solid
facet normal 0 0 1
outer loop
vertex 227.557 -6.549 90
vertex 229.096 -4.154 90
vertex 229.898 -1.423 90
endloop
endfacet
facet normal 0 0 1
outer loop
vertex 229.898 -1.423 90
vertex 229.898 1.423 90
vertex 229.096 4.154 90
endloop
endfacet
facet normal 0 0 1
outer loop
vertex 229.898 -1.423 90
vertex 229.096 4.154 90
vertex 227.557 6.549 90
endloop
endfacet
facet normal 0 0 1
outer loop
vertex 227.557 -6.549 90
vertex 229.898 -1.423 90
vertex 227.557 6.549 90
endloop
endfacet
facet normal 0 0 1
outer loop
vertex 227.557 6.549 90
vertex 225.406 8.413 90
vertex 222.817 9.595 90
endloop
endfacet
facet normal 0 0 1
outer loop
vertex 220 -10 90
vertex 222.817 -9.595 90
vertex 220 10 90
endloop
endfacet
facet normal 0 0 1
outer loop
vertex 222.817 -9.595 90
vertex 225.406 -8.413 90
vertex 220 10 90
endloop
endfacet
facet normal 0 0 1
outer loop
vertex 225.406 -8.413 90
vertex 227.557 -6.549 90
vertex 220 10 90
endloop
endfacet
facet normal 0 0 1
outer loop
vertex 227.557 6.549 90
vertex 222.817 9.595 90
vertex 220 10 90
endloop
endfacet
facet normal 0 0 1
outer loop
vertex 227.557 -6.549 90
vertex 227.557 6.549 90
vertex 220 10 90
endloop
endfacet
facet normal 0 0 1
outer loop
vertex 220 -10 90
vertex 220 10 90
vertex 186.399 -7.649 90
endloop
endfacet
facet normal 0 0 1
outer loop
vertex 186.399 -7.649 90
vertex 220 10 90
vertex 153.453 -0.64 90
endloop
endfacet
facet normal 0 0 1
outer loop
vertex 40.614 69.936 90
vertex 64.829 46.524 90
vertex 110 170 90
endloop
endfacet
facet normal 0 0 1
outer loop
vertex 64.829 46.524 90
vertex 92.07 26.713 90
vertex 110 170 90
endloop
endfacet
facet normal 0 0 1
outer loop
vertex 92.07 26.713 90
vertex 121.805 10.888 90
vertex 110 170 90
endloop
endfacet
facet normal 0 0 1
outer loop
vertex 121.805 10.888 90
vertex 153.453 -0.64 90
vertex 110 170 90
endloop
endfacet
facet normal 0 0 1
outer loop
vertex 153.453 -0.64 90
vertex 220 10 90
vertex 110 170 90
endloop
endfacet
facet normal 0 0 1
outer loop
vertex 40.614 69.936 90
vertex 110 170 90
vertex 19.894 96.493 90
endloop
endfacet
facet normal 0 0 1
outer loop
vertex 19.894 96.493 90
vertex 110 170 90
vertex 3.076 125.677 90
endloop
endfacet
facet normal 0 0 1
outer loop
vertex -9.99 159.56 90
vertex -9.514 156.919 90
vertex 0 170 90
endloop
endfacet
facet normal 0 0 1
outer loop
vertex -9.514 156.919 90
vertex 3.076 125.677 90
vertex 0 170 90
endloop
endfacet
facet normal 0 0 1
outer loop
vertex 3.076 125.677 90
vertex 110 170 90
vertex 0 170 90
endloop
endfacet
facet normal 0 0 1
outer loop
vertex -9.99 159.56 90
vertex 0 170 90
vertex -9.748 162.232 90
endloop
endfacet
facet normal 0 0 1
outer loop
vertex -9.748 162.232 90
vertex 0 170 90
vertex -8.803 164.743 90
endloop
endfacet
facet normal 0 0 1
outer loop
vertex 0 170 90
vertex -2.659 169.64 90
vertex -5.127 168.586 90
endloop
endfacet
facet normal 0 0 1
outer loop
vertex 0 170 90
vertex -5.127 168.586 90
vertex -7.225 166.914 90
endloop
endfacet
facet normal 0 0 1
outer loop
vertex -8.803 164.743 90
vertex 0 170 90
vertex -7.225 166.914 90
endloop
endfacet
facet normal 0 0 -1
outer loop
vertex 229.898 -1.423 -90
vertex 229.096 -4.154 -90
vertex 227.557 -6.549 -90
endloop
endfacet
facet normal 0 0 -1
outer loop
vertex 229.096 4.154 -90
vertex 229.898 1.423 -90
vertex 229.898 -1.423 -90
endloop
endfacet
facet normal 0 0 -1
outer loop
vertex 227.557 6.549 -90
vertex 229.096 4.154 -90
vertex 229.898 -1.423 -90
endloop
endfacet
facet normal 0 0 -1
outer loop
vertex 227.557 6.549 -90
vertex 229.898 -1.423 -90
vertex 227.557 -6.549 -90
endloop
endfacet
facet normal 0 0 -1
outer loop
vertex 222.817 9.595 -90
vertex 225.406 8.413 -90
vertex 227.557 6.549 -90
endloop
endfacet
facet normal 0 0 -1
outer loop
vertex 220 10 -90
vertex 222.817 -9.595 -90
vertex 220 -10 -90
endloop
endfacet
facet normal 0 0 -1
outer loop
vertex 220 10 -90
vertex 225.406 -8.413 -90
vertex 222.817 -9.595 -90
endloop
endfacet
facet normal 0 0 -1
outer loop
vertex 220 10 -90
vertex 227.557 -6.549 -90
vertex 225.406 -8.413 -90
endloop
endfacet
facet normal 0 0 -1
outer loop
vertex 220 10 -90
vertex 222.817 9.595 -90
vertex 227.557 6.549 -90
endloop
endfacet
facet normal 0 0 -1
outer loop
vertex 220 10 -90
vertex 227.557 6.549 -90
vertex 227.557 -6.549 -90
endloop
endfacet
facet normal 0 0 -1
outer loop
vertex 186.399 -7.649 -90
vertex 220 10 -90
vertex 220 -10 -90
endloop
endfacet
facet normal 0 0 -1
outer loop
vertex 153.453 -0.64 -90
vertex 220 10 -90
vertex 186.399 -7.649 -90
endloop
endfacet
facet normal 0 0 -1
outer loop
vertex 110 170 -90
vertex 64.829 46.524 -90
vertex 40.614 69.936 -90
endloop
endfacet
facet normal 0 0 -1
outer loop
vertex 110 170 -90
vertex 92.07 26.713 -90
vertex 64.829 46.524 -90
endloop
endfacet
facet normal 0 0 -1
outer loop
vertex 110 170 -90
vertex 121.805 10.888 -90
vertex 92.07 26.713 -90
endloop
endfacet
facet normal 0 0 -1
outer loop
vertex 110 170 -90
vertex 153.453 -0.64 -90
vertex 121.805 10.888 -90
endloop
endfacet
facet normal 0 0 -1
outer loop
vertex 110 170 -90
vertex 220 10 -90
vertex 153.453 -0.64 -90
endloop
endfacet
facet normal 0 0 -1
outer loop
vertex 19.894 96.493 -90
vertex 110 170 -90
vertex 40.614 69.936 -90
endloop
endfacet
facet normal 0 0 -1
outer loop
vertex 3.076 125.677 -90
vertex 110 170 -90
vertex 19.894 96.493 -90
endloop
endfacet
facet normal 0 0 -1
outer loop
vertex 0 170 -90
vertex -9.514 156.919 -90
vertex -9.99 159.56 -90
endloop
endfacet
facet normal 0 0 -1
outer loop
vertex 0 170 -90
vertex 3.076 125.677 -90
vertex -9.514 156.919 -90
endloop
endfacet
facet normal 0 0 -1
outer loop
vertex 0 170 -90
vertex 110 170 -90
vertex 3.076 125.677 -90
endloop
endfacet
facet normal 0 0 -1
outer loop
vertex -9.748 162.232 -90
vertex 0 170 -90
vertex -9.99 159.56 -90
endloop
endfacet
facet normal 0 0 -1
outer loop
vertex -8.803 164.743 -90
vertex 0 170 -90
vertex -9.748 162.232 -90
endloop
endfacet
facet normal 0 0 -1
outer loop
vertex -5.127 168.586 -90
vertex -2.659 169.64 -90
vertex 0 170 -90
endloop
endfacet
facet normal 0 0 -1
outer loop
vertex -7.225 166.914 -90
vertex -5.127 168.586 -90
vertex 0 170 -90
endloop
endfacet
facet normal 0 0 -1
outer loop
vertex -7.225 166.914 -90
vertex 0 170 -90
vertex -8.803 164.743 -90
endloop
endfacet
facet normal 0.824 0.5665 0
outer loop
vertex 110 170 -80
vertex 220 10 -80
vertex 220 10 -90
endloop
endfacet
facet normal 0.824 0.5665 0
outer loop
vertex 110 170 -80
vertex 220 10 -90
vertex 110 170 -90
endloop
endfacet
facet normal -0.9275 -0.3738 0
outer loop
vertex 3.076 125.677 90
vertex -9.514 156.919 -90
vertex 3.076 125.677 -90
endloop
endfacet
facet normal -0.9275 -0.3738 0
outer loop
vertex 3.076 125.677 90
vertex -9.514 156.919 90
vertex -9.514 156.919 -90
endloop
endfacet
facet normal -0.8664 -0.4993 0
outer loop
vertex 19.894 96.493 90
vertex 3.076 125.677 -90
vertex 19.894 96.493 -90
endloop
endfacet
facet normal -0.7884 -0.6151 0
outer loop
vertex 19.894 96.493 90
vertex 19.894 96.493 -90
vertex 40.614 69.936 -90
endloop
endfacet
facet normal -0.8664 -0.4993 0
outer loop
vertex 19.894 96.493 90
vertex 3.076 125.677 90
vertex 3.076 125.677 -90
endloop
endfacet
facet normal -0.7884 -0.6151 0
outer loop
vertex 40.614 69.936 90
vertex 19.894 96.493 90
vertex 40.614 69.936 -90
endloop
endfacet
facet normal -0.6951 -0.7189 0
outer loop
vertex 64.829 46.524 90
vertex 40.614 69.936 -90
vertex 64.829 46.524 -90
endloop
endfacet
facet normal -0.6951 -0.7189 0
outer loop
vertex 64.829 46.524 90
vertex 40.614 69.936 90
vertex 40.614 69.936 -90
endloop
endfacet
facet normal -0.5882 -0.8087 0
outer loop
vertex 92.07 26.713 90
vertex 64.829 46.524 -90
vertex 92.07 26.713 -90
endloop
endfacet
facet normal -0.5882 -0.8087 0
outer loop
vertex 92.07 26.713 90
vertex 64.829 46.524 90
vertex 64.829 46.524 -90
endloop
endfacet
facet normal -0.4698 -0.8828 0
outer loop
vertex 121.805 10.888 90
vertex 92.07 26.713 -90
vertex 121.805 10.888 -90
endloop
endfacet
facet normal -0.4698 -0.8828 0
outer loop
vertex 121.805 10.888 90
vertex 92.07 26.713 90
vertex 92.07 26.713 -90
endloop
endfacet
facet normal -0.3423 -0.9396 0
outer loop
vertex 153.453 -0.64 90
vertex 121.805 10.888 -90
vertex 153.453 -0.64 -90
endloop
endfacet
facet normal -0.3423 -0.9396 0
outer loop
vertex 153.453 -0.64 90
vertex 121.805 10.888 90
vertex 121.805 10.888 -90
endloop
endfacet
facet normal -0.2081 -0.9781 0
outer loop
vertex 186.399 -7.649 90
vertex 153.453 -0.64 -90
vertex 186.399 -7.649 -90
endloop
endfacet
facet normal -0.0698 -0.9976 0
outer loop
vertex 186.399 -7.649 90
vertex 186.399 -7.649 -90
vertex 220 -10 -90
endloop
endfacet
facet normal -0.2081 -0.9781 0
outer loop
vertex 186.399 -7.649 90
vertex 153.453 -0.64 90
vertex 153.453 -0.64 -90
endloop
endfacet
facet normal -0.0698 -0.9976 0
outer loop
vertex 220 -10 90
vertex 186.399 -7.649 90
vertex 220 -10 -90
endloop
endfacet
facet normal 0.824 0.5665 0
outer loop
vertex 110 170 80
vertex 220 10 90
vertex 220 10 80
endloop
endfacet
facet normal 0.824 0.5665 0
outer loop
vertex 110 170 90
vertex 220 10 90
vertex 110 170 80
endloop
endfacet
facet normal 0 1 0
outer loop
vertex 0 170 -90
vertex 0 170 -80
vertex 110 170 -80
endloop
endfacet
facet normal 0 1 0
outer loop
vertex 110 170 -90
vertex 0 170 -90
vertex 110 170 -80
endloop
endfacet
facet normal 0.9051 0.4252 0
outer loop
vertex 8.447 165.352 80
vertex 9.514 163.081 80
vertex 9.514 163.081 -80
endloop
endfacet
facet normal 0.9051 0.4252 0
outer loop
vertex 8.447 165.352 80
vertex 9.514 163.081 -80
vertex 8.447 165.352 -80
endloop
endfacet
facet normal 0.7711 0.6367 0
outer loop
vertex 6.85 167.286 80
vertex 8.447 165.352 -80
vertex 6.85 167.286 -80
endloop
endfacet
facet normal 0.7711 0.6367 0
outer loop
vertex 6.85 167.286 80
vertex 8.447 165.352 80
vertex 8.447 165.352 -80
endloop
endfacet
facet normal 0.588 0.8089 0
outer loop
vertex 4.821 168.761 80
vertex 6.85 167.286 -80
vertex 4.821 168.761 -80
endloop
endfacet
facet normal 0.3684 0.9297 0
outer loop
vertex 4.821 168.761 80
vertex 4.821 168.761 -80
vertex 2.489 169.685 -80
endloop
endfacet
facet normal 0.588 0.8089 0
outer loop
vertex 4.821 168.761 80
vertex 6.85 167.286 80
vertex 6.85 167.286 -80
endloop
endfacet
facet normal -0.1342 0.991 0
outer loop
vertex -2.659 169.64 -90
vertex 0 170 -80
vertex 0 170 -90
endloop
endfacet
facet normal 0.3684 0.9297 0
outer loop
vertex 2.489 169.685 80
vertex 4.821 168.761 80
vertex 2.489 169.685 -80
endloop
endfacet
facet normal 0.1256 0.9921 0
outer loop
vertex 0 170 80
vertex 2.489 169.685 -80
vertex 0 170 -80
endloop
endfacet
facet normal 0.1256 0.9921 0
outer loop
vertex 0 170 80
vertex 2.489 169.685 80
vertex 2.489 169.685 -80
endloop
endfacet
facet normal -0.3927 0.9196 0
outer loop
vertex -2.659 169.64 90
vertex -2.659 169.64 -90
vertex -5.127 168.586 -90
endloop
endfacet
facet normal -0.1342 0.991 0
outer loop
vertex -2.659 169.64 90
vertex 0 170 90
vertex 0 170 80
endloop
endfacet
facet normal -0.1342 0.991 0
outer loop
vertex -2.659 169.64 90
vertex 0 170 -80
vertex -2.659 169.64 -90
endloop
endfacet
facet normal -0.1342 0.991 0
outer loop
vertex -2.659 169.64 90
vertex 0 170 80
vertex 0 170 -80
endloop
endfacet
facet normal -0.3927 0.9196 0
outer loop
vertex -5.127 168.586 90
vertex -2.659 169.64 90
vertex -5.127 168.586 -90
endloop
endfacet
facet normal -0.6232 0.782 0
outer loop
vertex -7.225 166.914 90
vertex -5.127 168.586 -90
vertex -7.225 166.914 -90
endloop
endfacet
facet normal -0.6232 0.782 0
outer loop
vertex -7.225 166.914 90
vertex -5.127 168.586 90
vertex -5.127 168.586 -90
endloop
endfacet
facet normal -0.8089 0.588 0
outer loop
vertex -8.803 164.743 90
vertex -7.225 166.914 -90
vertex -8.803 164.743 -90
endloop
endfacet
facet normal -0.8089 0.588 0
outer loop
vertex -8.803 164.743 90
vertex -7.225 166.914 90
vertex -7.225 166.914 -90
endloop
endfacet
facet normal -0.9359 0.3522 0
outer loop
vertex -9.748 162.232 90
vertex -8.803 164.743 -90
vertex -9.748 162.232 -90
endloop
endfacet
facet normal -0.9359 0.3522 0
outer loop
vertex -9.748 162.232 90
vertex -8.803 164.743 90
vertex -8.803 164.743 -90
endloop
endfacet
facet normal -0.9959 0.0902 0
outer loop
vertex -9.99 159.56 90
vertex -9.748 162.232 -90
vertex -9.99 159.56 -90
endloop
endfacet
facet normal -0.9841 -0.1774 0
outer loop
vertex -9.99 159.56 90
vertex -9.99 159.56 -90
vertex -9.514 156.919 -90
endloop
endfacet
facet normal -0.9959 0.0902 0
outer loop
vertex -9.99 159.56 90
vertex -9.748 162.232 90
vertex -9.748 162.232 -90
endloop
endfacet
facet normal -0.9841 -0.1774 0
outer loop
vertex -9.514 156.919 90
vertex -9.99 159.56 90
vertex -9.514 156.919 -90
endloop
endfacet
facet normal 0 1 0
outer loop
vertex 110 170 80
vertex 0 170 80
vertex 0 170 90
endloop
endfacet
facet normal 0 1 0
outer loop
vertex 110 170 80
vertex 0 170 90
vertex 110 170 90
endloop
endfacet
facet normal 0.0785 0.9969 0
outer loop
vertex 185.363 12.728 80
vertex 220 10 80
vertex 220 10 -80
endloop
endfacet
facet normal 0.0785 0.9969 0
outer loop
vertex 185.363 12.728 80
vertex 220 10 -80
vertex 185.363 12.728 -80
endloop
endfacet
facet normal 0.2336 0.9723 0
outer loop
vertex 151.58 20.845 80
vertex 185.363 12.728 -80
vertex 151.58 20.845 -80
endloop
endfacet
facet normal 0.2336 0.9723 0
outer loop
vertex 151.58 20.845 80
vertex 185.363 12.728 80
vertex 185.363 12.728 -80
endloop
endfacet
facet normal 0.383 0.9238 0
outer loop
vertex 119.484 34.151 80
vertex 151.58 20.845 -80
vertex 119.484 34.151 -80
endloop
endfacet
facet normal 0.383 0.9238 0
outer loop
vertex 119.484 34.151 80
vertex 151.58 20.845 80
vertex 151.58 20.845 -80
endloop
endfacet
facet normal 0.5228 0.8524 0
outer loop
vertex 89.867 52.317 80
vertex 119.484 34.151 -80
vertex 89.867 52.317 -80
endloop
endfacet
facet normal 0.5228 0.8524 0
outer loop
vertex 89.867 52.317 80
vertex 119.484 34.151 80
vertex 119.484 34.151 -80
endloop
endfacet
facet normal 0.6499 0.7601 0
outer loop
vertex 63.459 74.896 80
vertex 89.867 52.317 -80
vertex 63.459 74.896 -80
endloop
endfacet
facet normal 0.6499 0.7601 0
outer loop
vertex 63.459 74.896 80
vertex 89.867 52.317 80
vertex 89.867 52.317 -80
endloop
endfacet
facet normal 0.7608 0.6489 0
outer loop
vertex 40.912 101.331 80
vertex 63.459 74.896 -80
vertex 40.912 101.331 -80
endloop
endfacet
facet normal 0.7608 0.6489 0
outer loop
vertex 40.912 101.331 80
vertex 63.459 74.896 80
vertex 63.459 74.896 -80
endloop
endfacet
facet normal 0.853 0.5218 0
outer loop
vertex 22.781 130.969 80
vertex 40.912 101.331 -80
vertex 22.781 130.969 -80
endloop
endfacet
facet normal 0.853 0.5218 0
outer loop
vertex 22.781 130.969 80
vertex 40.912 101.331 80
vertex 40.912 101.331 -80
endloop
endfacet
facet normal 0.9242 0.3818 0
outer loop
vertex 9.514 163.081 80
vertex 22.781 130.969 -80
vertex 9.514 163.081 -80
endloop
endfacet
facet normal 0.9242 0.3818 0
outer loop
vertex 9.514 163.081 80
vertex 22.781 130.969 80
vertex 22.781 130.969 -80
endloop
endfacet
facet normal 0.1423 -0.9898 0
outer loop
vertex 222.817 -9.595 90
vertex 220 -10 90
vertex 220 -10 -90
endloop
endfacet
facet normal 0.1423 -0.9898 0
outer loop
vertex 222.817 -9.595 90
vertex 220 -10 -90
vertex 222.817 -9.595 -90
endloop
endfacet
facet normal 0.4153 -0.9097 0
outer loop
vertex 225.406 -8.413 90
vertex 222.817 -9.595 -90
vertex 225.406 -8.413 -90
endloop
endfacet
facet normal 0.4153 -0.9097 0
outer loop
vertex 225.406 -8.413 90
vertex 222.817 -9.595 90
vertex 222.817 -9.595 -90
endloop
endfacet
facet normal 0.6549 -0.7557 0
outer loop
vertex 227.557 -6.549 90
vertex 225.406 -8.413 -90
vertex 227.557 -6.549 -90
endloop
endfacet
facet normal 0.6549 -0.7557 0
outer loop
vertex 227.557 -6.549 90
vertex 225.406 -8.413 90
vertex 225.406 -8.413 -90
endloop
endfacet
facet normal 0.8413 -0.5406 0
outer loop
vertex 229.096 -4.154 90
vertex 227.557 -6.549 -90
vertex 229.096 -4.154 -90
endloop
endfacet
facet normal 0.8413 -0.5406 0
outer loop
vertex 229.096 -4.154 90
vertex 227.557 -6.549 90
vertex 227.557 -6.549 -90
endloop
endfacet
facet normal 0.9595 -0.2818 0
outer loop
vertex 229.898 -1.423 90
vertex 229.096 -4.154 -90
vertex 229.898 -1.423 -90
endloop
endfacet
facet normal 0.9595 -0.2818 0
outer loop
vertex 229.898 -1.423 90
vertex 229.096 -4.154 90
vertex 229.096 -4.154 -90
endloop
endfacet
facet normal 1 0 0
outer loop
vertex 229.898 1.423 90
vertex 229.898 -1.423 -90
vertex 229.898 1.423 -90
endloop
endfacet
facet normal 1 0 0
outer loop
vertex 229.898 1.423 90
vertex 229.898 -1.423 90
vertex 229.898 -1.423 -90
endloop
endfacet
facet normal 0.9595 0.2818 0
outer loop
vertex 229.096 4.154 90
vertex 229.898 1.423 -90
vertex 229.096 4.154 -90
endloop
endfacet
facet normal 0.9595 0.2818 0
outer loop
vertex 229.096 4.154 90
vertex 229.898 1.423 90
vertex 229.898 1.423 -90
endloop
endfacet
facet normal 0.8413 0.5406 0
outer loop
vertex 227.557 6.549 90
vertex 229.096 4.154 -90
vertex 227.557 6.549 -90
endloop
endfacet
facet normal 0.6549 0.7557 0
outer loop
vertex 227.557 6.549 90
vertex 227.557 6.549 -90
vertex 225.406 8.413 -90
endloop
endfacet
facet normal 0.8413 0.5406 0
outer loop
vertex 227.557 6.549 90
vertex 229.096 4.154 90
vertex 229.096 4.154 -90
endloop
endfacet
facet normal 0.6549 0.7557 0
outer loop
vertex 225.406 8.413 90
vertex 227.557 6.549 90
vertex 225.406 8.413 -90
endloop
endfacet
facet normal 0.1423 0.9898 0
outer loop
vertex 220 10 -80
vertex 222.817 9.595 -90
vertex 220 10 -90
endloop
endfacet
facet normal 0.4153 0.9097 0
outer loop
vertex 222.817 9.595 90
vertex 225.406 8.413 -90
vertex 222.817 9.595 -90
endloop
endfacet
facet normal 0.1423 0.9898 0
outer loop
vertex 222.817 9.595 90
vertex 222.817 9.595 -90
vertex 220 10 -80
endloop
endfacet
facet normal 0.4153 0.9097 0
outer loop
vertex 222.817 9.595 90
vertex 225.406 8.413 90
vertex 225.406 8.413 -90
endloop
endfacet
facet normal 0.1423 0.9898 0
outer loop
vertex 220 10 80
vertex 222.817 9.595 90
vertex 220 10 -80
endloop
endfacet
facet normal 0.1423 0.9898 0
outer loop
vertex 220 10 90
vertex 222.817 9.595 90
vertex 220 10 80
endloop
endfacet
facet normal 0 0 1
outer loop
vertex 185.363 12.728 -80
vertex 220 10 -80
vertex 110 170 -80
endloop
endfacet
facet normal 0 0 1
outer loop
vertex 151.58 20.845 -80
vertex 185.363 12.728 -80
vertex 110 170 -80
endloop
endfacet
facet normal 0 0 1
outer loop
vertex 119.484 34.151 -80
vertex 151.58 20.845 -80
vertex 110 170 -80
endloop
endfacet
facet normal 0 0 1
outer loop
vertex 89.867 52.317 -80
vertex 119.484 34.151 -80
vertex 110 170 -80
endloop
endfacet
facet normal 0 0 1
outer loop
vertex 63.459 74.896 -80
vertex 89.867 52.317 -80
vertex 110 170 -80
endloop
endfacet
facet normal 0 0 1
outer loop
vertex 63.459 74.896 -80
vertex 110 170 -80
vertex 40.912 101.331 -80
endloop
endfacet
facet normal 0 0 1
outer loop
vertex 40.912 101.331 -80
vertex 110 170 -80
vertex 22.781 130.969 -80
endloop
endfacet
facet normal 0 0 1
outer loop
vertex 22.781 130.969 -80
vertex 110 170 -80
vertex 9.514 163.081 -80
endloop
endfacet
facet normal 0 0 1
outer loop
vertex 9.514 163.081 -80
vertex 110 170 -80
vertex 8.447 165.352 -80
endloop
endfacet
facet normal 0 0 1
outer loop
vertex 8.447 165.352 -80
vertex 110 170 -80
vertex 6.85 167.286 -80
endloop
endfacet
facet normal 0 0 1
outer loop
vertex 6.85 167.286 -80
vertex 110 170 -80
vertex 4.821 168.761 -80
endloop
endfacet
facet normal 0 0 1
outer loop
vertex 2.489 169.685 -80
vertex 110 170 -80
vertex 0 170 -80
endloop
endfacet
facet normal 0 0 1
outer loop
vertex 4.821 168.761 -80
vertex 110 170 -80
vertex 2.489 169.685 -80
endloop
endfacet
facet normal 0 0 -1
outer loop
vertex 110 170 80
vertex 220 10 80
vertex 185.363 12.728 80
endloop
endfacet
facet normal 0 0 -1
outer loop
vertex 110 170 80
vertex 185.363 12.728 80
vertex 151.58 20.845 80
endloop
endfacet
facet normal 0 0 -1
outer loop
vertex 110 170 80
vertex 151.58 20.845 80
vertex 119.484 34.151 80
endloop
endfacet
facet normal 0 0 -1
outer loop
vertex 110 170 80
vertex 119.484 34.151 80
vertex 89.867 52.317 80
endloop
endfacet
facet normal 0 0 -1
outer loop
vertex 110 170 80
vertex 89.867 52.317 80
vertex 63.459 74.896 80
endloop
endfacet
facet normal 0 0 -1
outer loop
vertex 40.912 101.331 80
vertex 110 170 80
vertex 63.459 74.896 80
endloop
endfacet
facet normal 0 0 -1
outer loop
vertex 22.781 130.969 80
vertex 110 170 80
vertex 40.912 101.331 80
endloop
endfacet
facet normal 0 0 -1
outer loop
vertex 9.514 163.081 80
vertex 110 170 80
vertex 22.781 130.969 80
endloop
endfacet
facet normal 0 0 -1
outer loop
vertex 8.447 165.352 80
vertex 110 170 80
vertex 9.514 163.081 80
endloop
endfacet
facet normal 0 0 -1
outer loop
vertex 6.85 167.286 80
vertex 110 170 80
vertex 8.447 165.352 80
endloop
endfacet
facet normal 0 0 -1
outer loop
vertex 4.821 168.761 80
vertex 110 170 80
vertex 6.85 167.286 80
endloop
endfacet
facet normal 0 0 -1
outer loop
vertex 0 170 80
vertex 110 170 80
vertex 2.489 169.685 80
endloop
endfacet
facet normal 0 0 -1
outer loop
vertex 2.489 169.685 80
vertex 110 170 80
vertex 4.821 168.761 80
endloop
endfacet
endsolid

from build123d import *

# Parameters (mm, degrees)
BASE_DEPTH         = 90
WALL_DEPTH         = 10
CUT_EXTRUDE2_DEPTH = 181


with BuildPart() as part:
    # Sketch1 → Base (new body, symmetric)
    with BuildSketch(Plane.XY):
        with BuildLine():
            ThreePointArc((-9.513513741, 156.91891962), (78.103574675, 36.142415178), (220.000000737, -10))
            ThreePointArc((220.000000737, -10), (230, 7.37e-07), (219.999999263, 10))
            ThreePointArc((219.999999263, 10), (89.867008629, 52.317136864), (9.513513741, 163.08108038))
            ThreePointArc((9.513513741, 163.08108038), (-3.08108038, 169.513513741), (-9.513513741, 156.91891962))
        make_face()
    extrude(amount=BASE_DEPTH, both=True)

    # Sketch3 → Wall (add)
    with BuildSketch(Plane.XY.offset(80)):
        with BuildLine():
            Line((0, 170), (219.999999263, 170))
            Line((219.999999263, 170), (219.999999263, 10))
            ThreePointArc((219.999999263, 10), (89.867008629, 52.317136864), (9.513513741, 163.08108038))
            ThreePointArc((9.513513741, 163.08108038), (5.881717275, 168.087360626), (0, 170))
        make_face()
    wall = extrude(amount=WALL_DEPTH)

    # Mirror4: Wall across plane
    add(wall.mirror(Plane(origin=(0, 0, 0), x_dir=(1, 0, 0), z_dir=(0, 0, -1))))

    # Sketch5 → Cut-Extrude2 (cut, through all)
    with BuildSketch(Plane.XY.offset(90)):
        Polygon((219.999999263, 10), (109.999999631, 170), (219.999999263, 170), align=None)
    extrude(amount=-CUT_EXTRUDE2_DEPTH, mode=Mode.SUBTRACT)


solid = part.part
